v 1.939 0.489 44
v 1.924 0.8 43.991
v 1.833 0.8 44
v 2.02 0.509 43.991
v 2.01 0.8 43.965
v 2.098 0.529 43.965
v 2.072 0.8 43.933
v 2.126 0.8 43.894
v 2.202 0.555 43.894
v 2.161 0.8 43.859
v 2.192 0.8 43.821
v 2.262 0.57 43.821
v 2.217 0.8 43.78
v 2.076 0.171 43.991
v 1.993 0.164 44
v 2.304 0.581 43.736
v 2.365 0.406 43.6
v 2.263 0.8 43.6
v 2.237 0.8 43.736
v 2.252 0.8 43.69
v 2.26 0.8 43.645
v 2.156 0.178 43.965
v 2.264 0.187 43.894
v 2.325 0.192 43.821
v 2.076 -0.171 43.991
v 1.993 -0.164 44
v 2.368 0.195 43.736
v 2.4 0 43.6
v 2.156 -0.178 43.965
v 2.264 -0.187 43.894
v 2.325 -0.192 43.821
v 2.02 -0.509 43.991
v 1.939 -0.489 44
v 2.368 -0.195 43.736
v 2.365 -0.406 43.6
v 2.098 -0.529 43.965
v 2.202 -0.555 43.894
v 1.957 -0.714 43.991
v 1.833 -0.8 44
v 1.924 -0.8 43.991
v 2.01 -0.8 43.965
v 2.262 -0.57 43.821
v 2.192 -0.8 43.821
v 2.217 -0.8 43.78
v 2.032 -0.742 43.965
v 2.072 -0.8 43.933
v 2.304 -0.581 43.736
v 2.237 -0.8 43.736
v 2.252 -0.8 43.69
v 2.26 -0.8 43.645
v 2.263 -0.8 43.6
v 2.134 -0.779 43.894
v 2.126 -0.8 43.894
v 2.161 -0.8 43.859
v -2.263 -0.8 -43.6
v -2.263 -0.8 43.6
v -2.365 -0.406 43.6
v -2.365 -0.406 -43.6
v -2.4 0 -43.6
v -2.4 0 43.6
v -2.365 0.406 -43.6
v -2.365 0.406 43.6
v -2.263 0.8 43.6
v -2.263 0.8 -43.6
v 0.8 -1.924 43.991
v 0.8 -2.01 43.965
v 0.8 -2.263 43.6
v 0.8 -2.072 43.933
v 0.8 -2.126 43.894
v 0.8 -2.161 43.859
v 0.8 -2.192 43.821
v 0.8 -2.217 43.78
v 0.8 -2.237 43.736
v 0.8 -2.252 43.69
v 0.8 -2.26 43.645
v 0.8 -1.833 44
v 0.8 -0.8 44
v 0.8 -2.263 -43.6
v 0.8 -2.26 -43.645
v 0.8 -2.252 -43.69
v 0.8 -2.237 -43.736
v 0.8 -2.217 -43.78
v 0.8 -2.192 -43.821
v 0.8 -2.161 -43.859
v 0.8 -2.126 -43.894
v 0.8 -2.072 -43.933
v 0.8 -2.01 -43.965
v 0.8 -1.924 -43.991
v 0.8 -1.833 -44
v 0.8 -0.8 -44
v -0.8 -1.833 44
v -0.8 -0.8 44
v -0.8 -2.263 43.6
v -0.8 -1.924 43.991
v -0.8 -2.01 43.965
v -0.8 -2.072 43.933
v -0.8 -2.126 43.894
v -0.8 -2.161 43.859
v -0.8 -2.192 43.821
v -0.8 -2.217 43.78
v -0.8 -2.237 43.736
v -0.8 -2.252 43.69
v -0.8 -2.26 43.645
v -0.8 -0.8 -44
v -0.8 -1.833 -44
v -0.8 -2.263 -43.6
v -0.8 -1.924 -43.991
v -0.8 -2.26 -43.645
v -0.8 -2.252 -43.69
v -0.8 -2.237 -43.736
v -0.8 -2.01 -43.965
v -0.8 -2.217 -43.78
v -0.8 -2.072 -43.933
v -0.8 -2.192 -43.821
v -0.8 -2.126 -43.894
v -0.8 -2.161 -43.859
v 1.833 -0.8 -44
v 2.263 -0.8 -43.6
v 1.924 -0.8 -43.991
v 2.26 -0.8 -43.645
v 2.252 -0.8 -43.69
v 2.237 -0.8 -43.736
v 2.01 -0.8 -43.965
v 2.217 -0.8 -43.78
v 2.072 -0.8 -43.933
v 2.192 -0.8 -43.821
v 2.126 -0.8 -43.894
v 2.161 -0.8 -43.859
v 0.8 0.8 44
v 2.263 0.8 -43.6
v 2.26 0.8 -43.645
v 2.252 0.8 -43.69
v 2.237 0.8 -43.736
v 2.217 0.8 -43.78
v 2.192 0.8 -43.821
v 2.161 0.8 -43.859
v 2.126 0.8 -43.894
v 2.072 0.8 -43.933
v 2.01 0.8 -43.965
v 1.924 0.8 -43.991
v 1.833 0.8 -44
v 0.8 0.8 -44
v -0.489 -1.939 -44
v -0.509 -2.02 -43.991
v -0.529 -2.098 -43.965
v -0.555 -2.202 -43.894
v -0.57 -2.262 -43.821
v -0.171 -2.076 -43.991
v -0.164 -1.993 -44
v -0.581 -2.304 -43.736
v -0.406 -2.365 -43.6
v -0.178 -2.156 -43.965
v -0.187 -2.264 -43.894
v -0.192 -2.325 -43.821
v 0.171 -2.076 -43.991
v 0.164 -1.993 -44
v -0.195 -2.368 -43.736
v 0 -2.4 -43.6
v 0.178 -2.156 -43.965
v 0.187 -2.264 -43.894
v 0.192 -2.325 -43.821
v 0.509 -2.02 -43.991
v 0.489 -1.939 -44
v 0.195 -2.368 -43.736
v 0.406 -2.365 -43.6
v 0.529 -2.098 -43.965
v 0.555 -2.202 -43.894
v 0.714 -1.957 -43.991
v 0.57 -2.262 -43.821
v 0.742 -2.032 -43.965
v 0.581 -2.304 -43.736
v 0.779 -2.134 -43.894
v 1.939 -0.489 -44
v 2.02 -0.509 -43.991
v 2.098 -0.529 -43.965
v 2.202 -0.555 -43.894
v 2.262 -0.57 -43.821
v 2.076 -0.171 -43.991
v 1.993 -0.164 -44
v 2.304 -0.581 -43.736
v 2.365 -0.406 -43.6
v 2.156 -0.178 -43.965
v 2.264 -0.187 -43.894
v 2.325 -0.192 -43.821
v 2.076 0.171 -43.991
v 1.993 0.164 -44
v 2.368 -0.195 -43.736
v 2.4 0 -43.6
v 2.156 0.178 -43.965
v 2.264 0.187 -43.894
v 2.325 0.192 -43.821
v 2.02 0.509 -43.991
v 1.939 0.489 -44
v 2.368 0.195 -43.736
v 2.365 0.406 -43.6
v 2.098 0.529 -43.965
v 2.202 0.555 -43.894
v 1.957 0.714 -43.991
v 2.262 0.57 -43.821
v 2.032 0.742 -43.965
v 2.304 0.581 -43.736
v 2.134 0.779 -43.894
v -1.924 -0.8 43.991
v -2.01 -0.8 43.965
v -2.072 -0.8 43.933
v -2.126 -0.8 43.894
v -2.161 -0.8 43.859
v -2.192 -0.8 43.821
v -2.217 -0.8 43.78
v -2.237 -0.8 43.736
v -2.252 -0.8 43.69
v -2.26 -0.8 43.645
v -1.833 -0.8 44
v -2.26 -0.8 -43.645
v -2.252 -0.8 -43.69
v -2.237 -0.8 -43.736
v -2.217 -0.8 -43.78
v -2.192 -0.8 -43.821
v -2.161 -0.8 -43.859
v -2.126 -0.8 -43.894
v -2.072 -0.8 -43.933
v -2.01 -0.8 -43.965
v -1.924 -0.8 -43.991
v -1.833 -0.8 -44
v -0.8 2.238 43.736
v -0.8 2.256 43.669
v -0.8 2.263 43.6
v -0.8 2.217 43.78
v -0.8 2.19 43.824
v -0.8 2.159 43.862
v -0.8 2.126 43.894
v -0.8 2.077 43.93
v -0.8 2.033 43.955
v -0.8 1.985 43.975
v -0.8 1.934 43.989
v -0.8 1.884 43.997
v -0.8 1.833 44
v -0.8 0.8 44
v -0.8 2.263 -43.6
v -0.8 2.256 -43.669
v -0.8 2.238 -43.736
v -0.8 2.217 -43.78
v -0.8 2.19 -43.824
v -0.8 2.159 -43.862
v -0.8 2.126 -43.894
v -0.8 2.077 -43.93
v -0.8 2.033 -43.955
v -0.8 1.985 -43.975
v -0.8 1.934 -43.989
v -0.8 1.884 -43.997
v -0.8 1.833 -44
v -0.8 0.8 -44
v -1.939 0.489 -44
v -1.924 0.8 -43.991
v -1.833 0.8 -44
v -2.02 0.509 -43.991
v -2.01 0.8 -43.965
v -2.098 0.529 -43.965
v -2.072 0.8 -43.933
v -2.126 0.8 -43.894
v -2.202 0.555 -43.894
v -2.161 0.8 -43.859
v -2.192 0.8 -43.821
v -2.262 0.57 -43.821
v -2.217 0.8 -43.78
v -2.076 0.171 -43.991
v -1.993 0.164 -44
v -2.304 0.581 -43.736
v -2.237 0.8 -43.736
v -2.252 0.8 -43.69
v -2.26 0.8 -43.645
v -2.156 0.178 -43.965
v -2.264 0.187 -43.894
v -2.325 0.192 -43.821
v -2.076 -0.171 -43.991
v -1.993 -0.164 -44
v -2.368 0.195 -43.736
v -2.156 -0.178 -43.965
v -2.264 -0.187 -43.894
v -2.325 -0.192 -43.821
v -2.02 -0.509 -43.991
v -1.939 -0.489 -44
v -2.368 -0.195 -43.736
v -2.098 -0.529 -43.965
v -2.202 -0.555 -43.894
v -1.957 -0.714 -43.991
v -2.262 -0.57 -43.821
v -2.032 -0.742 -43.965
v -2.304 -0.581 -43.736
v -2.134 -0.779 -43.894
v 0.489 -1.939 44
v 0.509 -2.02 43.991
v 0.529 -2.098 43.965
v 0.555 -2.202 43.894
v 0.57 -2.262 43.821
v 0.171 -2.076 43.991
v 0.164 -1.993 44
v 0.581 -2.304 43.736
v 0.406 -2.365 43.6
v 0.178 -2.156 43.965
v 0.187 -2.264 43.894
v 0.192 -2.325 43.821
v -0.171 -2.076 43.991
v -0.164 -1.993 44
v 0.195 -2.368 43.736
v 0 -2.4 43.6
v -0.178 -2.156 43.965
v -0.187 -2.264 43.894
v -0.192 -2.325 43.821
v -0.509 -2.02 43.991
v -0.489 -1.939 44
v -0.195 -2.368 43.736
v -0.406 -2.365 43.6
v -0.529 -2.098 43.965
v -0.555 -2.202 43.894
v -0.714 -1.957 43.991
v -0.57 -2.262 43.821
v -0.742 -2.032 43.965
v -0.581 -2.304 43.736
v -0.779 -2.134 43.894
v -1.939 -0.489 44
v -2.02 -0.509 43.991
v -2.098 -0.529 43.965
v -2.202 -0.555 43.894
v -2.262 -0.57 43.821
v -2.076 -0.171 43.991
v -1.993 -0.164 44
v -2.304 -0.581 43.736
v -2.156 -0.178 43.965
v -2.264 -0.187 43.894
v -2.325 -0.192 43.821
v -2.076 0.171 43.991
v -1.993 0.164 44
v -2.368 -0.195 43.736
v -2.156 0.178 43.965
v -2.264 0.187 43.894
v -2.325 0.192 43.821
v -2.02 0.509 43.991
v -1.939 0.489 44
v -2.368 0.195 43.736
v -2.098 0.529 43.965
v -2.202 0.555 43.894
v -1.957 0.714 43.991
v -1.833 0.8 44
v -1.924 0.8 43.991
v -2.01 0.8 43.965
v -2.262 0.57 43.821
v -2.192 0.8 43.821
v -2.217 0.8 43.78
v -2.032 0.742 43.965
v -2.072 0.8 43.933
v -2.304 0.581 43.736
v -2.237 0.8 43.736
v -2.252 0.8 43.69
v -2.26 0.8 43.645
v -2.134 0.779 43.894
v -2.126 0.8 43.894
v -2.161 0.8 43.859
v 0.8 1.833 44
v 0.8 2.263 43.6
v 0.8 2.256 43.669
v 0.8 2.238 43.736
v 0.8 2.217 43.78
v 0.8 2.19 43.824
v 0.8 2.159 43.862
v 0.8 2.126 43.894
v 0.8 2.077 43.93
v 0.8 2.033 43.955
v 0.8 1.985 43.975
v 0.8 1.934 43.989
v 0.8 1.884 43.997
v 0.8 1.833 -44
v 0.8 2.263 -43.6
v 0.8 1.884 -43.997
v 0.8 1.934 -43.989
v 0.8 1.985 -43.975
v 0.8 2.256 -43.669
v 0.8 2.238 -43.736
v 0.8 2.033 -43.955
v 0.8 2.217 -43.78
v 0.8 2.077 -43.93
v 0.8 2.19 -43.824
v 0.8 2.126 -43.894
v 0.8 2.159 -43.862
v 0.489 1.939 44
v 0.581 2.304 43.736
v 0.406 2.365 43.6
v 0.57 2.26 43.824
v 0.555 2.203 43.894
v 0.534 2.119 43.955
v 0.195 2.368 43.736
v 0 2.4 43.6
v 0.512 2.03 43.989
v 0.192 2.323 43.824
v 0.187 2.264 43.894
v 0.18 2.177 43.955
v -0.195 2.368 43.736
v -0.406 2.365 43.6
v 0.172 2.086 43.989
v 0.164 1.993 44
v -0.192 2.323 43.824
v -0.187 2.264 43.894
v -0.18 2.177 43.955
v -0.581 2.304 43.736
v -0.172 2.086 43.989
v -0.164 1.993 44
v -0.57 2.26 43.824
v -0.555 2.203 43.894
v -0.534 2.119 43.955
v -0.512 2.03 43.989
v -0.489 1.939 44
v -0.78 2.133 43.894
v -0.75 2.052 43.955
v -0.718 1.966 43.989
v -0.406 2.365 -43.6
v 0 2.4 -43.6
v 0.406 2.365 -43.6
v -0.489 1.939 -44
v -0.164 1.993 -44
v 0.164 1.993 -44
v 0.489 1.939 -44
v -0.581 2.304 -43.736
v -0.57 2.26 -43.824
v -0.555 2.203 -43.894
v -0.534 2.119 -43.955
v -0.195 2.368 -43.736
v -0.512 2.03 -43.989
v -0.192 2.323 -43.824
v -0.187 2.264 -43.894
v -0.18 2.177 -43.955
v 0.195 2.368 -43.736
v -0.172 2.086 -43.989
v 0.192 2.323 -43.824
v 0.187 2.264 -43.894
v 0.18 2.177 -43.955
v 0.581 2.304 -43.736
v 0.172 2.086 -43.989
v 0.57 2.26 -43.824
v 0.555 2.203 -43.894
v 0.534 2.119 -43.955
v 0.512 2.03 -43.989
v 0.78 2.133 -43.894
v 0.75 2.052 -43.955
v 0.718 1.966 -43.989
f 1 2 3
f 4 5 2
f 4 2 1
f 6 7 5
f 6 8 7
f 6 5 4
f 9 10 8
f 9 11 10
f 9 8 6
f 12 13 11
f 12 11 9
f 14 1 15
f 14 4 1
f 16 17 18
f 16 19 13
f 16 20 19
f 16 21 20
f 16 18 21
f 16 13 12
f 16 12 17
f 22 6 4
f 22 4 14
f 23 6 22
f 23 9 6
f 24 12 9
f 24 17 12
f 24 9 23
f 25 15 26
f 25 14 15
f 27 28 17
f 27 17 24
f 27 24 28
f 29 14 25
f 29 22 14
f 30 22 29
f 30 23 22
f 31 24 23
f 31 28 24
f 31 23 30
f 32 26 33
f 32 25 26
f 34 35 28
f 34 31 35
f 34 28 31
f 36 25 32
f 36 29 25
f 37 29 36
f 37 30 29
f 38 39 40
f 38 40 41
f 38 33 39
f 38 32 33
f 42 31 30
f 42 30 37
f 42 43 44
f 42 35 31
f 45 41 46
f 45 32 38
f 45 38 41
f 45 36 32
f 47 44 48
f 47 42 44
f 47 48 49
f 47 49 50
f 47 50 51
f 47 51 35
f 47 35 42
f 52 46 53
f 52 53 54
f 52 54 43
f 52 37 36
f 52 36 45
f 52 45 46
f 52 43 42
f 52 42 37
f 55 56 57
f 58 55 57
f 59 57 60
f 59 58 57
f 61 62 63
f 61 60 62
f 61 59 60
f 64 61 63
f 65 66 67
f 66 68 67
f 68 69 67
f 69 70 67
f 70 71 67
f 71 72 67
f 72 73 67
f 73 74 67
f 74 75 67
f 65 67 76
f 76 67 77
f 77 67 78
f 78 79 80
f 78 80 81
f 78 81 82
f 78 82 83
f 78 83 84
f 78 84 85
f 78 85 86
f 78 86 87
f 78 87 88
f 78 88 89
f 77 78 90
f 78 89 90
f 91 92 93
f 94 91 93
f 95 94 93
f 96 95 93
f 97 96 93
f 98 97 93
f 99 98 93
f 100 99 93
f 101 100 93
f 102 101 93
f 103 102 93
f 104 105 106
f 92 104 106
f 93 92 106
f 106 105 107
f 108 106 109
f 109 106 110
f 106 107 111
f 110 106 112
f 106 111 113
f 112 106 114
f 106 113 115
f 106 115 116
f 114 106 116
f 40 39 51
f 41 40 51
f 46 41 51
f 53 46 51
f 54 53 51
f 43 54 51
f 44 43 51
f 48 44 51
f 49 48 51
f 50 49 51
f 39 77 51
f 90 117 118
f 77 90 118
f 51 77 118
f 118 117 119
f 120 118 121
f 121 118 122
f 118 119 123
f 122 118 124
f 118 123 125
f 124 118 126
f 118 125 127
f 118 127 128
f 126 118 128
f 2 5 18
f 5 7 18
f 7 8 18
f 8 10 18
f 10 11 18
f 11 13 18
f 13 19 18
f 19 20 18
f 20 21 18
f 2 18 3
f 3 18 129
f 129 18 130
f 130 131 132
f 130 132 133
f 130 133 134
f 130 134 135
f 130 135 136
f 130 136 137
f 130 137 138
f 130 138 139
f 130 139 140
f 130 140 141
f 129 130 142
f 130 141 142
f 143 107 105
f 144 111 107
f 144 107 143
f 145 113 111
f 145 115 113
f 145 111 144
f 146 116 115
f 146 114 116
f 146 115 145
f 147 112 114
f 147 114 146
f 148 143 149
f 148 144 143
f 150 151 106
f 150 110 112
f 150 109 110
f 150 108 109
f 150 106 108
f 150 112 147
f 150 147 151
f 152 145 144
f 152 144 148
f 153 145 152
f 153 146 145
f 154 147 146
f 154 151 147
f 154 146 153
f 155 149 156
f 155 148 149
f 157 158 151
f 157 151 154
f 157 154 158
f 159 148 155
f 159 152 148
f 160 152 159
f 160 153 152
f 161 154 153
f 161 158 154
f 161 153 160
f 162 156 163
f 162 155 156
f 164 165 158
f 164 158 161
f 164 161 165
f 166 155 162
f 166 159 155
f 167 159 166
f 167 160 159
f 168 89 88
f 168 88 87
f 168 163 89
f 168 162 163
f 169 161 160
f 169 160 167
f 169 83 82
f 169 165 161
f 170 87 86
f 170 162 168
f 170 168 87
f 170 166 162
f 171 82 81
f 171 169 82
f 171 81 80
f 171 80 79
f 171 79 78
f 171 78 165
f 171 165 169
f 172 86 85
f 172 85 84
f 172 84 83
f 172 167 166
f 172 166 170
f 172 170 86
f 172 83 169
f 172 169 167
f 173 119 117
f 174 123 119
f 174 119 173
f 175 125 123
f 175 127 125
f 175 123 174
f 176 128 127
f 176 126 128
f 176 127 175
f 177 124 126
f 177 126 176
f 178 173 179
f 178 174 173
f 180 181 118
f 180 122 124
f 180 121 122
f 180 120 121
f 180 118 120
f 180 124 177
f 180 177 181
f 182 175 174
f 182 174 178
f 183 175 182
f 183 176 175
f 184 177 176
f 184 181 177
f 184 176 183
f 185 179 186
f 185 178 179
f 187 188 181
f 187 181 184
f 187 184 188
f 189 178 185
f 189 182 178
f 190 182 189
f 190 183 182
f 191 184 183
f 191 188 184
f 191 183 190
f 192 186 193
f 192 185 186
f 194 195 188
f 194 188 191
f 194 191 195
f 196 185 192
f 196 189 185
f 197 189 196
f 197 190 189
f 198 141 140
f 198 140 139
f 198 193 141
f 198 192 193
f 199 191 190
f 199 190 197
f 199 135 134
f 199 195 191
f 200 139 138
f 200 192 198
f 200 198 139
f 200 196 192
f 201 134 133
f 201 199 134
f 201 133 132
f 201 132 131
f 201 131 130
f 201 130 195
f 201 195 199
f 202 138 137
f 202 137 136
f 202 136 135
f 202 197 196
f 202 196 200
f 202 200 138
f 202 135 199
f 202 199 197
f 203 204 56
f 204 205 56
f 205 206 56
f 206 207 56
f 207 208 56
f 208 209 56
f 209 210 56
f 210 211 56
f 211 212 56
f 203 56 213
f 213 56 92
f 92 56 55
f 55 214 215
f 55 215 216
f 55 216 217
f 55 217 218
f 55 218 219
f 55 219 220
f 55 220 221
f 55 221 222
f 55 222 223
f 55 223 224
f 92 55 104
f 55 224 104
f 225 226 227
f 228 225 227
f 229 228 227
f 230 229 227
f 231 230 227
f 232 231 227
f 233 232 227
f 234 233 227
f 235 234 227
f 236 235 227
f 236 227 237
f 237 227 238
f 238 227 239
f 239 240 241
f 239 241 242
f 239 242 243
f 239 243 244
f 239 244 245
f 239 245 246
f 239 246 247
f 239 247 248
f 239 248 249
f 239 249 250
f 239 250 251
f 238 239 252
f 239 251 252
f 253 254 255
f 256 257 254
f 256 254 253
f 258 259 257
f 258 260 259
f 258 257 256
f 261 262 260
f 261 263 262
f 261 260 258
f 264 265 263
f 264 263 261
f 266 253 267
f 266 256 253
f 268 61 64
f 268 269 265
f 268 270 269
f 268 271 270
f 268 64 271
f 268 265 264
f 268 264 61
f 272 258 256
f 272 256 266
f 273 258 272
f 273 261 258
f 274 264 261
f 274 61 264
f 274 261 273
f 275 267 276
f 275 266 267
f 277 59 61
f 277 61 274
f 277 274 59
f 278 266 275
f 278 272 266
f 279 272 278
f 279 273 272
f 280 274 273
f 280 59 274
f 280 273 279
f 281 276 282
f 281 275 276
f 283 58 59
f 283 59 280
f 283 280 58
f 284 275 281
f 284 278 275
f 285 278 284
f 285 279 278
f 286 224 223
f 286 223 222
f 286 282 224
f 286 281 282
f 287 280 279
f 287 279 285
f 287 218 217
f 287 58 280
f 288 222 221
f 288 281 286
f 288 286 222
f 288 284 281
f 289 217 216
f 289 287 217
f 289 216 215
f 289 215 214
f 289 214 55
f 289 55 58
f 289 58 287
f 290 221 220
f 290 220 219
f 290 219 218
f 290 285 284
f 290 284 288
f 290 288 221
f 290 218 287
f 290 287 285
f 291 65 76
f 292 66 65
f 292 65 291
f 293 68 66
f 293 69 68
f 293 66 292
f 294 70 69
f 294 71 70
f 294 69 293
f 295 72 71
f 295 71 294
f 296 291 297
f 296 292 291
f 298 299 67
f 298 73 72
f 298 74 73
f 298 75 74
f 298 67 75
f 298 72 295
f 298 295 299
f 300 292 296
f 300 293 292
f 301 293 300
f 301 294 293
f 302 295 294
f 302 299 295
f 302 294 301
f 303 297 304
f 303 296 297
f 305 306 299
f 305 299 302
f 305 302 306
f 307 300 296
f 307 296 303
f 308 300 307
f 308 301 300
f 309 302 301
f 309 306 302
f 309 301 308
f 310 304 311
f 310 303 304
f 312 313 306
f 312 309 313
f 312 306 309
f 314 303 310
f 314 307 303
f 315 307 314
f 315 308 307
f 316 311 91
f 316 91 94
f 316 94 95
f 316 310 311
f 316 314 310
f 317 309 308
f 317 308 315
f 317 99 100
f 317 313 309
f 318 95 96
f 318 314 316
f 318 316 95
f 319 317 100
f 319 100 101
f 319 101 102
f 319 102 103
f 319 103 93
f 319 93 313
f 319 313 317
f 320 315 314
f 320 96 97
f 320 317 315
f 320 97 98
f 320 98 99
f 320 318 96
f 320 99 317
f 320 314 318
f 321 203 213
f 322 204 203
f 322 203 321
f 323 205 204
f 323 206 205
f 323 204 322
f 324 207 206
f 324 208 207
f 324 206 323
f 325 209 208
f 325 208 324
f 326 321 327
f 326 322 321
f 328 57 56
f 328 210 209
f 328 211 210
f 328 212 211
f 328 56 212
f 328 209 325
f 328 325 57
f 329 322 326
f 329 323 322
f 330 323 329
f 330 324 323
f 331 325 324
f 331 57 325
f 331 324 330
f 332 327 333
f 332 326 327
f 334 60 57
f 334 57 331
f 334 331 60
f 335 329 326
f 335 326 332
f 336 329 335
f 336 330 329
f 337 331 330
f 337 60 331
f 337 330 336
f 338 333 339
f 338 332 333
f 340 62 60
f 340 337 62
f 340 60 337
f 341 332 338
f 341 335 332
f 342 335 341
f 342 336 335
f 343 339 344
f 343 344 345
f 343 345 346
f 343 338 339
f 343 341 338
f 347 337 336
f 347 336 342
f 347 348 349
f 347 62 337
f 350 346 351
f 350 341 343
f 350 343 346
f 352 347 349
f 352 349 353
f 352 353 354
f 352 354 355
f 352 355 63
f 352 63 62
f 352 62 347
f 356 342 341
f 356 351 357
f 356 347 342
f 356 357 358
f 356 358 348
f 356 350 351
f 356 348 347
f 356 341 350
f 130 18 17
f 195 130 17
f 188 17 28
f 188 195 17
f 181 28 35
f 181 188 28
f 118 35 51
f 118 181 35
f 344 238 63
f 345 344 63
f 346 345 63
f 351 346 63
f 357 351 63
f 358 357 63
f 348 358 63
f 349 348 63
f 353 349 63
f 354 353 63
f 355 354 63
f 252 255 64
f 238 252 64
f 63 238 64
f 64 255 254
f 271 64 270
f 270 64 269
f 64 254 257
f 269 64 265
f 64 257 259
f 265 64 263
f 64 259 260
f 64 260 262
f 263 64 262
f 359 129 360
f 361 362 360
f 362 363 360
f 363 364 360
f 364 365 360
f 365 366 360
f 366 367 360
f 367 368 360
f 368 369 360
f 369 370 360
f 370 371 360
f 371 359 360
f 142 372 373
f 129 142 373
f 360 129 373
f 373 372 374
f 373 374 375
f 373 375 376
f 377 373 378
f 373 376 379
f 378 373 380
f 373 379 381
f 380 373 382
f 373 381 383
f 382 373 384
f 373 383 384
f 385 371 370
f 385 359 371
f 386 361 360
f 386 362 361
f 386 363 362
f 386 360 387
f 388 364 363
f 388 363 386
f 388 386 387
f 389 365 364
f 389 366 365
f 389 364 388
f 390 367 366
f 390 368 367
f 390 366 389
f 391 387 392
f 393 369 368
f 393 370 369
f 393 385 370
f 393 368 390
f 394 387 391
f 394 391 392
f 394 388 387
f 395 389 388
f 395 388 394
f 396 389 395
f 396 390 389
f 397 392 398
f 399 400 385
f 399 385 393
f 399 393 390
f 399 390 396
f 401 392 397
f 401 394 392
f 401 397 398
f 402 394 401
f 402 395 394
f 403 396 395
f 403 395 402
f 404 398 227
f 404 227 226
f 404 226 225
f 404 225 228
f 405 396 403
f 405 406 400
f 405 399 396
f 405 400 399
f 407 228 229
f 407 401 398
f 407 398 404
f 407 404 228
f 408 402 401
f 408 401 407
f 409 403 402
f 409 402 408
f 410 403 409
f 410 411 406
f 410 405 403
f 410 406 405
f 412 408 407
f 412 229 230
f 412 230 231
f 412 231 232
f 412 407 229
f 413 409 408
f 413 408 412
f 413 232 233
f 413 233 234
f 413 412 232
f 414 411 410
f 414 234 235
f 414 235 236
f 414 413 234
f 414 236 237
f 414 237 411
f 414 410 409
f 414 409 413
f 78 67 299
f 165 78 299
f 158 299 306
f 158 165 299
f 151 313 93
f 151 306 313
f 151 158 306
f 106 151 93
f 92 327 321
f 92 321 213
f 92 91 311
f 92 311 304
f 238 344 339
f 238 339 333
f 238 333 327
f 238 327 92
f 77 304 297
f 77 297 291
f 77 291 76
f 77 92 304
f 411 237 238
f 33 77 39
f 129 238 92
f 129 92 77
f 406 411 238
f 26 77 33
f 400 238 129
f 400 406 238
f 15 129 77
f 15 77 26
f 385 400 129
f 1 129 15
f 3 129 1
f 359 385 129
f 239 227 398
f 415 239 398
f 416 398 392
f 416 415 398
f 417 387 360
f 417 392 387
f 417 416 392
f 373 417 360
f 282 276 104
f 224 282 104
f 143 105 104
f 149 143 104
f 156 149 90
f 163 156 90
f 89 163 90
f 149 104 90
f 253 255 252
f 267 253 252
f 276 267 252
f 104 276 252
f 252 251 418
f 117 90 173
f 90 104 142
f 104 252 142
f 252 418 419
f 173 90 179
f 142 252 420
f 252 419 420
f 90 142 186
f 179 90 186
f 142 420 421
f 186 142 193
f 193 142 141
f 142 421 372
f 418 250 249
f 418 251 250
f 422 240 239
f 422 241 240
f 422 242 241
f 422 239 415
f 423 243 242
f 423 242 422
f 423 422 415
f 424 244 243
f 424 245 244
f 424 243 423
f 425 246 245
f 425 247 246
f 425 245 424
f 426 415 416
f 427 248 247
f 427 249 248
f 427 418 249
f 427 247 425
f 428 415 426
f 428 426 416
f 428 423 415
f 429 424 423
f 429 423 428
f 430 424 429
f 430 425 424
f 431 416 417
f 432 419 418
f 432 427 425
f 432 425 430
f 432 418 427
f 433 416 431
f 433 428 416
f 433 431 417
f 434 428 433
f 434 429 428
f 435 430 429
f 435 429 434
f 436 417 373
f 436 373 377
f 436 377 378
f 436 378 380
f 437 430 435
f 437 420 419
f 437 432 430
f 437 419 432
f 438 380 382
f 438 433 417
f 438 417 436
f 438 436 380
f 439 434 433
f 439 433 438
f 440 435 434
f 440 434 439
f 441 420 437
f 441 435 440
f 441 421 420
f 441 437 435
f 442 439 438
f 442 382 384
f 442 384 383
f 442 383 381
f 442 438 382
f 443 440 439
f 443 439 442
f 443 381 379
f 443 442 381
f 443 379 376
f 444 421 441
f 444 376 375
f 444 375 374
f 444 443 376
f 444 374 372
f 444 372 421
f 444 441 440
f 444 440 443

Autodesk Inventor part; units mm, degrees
ref_plane "YZ Plane" through (0, 0, 0) normal (1, 0, 0) x (0, 1, 0)
ref_plane "XZ Plane" through (0, 0, 0) normal (0, 1, 0) x (-1, 0, 0)
ref_plane "XY Plane" through (0, 0, 0) normal (0, 0, 1) x (1, 0, 0)
sketch "Sketch1" plane through (0, 0, 0) normal (0, 0, 1) x (1, 0, 0)
  circle A0 centre (0, 0) radius 2.4 construction
  line L0 (-0.8, 2.2627) -> (-0.8, 0.8)
  line L1 (-0.8, 0.8) -> (-2.2627, 0.8)
  line L2 (-2.2627, -0.8) -> (-0.8, -0.8)
  line L3 (-0.8, -0.8) -> (-0.8, -2.2627)
  line L4 (0.8, -2.2627) -> (0.8, -0.8)
  line L5 (0.8, -0.8) -> (2.2627, -0.8)
  line L6 (2.2627, 0.8) -> (0.8, 0.8)
  line L7 (0.8, 0.8) -> (0.8, 2.2627)
  arc A1 (0.8, 2.2627) -> (-0.8, 2.2627) centre (0, 0) ccw
  arc A2 (-2.2627, 0.8) -> (-2.2627, -0.8) centre (0, 0) ccw
  arc A3 (-0.8, -2.2627) -> (0.8, -2.2627) centre (0, 0) ccw
  arc A4 (2.2627, -0.8) -> (2.2627, 0.8) centre (0, 0) ccw
  dimension "d0" = 4.8
  dimension "d1" = 1.6
extrude "Extrusion1" add sketch "Sketch1" along normal mid plane 88
fillet "Fillet1" radius 0.4 8 edges at (0, 2.4, 44) (-2.4, 0, 44) (0, -2.4, 44) (2.4, 0, 44) (2.4, 0, -44) (0, 2.4, -44) (-2.4, 0, -44) (0, -2.4, -44)
equation "\"d0\" = kd"
equation "\"d1\" = axlet"
equation "\"d2\" = 11 * lu"
equation "\"d4\" = tf"
equation "\"unit\" = 8"
equation "\"kd\" = 4.8"
equation "\"axlet\" = 1.6"
equation "\"lu\" = 8"
equation "\"tf\" = 0.4"
properties part number "23948-Yellow" material "ABS Plastic"
